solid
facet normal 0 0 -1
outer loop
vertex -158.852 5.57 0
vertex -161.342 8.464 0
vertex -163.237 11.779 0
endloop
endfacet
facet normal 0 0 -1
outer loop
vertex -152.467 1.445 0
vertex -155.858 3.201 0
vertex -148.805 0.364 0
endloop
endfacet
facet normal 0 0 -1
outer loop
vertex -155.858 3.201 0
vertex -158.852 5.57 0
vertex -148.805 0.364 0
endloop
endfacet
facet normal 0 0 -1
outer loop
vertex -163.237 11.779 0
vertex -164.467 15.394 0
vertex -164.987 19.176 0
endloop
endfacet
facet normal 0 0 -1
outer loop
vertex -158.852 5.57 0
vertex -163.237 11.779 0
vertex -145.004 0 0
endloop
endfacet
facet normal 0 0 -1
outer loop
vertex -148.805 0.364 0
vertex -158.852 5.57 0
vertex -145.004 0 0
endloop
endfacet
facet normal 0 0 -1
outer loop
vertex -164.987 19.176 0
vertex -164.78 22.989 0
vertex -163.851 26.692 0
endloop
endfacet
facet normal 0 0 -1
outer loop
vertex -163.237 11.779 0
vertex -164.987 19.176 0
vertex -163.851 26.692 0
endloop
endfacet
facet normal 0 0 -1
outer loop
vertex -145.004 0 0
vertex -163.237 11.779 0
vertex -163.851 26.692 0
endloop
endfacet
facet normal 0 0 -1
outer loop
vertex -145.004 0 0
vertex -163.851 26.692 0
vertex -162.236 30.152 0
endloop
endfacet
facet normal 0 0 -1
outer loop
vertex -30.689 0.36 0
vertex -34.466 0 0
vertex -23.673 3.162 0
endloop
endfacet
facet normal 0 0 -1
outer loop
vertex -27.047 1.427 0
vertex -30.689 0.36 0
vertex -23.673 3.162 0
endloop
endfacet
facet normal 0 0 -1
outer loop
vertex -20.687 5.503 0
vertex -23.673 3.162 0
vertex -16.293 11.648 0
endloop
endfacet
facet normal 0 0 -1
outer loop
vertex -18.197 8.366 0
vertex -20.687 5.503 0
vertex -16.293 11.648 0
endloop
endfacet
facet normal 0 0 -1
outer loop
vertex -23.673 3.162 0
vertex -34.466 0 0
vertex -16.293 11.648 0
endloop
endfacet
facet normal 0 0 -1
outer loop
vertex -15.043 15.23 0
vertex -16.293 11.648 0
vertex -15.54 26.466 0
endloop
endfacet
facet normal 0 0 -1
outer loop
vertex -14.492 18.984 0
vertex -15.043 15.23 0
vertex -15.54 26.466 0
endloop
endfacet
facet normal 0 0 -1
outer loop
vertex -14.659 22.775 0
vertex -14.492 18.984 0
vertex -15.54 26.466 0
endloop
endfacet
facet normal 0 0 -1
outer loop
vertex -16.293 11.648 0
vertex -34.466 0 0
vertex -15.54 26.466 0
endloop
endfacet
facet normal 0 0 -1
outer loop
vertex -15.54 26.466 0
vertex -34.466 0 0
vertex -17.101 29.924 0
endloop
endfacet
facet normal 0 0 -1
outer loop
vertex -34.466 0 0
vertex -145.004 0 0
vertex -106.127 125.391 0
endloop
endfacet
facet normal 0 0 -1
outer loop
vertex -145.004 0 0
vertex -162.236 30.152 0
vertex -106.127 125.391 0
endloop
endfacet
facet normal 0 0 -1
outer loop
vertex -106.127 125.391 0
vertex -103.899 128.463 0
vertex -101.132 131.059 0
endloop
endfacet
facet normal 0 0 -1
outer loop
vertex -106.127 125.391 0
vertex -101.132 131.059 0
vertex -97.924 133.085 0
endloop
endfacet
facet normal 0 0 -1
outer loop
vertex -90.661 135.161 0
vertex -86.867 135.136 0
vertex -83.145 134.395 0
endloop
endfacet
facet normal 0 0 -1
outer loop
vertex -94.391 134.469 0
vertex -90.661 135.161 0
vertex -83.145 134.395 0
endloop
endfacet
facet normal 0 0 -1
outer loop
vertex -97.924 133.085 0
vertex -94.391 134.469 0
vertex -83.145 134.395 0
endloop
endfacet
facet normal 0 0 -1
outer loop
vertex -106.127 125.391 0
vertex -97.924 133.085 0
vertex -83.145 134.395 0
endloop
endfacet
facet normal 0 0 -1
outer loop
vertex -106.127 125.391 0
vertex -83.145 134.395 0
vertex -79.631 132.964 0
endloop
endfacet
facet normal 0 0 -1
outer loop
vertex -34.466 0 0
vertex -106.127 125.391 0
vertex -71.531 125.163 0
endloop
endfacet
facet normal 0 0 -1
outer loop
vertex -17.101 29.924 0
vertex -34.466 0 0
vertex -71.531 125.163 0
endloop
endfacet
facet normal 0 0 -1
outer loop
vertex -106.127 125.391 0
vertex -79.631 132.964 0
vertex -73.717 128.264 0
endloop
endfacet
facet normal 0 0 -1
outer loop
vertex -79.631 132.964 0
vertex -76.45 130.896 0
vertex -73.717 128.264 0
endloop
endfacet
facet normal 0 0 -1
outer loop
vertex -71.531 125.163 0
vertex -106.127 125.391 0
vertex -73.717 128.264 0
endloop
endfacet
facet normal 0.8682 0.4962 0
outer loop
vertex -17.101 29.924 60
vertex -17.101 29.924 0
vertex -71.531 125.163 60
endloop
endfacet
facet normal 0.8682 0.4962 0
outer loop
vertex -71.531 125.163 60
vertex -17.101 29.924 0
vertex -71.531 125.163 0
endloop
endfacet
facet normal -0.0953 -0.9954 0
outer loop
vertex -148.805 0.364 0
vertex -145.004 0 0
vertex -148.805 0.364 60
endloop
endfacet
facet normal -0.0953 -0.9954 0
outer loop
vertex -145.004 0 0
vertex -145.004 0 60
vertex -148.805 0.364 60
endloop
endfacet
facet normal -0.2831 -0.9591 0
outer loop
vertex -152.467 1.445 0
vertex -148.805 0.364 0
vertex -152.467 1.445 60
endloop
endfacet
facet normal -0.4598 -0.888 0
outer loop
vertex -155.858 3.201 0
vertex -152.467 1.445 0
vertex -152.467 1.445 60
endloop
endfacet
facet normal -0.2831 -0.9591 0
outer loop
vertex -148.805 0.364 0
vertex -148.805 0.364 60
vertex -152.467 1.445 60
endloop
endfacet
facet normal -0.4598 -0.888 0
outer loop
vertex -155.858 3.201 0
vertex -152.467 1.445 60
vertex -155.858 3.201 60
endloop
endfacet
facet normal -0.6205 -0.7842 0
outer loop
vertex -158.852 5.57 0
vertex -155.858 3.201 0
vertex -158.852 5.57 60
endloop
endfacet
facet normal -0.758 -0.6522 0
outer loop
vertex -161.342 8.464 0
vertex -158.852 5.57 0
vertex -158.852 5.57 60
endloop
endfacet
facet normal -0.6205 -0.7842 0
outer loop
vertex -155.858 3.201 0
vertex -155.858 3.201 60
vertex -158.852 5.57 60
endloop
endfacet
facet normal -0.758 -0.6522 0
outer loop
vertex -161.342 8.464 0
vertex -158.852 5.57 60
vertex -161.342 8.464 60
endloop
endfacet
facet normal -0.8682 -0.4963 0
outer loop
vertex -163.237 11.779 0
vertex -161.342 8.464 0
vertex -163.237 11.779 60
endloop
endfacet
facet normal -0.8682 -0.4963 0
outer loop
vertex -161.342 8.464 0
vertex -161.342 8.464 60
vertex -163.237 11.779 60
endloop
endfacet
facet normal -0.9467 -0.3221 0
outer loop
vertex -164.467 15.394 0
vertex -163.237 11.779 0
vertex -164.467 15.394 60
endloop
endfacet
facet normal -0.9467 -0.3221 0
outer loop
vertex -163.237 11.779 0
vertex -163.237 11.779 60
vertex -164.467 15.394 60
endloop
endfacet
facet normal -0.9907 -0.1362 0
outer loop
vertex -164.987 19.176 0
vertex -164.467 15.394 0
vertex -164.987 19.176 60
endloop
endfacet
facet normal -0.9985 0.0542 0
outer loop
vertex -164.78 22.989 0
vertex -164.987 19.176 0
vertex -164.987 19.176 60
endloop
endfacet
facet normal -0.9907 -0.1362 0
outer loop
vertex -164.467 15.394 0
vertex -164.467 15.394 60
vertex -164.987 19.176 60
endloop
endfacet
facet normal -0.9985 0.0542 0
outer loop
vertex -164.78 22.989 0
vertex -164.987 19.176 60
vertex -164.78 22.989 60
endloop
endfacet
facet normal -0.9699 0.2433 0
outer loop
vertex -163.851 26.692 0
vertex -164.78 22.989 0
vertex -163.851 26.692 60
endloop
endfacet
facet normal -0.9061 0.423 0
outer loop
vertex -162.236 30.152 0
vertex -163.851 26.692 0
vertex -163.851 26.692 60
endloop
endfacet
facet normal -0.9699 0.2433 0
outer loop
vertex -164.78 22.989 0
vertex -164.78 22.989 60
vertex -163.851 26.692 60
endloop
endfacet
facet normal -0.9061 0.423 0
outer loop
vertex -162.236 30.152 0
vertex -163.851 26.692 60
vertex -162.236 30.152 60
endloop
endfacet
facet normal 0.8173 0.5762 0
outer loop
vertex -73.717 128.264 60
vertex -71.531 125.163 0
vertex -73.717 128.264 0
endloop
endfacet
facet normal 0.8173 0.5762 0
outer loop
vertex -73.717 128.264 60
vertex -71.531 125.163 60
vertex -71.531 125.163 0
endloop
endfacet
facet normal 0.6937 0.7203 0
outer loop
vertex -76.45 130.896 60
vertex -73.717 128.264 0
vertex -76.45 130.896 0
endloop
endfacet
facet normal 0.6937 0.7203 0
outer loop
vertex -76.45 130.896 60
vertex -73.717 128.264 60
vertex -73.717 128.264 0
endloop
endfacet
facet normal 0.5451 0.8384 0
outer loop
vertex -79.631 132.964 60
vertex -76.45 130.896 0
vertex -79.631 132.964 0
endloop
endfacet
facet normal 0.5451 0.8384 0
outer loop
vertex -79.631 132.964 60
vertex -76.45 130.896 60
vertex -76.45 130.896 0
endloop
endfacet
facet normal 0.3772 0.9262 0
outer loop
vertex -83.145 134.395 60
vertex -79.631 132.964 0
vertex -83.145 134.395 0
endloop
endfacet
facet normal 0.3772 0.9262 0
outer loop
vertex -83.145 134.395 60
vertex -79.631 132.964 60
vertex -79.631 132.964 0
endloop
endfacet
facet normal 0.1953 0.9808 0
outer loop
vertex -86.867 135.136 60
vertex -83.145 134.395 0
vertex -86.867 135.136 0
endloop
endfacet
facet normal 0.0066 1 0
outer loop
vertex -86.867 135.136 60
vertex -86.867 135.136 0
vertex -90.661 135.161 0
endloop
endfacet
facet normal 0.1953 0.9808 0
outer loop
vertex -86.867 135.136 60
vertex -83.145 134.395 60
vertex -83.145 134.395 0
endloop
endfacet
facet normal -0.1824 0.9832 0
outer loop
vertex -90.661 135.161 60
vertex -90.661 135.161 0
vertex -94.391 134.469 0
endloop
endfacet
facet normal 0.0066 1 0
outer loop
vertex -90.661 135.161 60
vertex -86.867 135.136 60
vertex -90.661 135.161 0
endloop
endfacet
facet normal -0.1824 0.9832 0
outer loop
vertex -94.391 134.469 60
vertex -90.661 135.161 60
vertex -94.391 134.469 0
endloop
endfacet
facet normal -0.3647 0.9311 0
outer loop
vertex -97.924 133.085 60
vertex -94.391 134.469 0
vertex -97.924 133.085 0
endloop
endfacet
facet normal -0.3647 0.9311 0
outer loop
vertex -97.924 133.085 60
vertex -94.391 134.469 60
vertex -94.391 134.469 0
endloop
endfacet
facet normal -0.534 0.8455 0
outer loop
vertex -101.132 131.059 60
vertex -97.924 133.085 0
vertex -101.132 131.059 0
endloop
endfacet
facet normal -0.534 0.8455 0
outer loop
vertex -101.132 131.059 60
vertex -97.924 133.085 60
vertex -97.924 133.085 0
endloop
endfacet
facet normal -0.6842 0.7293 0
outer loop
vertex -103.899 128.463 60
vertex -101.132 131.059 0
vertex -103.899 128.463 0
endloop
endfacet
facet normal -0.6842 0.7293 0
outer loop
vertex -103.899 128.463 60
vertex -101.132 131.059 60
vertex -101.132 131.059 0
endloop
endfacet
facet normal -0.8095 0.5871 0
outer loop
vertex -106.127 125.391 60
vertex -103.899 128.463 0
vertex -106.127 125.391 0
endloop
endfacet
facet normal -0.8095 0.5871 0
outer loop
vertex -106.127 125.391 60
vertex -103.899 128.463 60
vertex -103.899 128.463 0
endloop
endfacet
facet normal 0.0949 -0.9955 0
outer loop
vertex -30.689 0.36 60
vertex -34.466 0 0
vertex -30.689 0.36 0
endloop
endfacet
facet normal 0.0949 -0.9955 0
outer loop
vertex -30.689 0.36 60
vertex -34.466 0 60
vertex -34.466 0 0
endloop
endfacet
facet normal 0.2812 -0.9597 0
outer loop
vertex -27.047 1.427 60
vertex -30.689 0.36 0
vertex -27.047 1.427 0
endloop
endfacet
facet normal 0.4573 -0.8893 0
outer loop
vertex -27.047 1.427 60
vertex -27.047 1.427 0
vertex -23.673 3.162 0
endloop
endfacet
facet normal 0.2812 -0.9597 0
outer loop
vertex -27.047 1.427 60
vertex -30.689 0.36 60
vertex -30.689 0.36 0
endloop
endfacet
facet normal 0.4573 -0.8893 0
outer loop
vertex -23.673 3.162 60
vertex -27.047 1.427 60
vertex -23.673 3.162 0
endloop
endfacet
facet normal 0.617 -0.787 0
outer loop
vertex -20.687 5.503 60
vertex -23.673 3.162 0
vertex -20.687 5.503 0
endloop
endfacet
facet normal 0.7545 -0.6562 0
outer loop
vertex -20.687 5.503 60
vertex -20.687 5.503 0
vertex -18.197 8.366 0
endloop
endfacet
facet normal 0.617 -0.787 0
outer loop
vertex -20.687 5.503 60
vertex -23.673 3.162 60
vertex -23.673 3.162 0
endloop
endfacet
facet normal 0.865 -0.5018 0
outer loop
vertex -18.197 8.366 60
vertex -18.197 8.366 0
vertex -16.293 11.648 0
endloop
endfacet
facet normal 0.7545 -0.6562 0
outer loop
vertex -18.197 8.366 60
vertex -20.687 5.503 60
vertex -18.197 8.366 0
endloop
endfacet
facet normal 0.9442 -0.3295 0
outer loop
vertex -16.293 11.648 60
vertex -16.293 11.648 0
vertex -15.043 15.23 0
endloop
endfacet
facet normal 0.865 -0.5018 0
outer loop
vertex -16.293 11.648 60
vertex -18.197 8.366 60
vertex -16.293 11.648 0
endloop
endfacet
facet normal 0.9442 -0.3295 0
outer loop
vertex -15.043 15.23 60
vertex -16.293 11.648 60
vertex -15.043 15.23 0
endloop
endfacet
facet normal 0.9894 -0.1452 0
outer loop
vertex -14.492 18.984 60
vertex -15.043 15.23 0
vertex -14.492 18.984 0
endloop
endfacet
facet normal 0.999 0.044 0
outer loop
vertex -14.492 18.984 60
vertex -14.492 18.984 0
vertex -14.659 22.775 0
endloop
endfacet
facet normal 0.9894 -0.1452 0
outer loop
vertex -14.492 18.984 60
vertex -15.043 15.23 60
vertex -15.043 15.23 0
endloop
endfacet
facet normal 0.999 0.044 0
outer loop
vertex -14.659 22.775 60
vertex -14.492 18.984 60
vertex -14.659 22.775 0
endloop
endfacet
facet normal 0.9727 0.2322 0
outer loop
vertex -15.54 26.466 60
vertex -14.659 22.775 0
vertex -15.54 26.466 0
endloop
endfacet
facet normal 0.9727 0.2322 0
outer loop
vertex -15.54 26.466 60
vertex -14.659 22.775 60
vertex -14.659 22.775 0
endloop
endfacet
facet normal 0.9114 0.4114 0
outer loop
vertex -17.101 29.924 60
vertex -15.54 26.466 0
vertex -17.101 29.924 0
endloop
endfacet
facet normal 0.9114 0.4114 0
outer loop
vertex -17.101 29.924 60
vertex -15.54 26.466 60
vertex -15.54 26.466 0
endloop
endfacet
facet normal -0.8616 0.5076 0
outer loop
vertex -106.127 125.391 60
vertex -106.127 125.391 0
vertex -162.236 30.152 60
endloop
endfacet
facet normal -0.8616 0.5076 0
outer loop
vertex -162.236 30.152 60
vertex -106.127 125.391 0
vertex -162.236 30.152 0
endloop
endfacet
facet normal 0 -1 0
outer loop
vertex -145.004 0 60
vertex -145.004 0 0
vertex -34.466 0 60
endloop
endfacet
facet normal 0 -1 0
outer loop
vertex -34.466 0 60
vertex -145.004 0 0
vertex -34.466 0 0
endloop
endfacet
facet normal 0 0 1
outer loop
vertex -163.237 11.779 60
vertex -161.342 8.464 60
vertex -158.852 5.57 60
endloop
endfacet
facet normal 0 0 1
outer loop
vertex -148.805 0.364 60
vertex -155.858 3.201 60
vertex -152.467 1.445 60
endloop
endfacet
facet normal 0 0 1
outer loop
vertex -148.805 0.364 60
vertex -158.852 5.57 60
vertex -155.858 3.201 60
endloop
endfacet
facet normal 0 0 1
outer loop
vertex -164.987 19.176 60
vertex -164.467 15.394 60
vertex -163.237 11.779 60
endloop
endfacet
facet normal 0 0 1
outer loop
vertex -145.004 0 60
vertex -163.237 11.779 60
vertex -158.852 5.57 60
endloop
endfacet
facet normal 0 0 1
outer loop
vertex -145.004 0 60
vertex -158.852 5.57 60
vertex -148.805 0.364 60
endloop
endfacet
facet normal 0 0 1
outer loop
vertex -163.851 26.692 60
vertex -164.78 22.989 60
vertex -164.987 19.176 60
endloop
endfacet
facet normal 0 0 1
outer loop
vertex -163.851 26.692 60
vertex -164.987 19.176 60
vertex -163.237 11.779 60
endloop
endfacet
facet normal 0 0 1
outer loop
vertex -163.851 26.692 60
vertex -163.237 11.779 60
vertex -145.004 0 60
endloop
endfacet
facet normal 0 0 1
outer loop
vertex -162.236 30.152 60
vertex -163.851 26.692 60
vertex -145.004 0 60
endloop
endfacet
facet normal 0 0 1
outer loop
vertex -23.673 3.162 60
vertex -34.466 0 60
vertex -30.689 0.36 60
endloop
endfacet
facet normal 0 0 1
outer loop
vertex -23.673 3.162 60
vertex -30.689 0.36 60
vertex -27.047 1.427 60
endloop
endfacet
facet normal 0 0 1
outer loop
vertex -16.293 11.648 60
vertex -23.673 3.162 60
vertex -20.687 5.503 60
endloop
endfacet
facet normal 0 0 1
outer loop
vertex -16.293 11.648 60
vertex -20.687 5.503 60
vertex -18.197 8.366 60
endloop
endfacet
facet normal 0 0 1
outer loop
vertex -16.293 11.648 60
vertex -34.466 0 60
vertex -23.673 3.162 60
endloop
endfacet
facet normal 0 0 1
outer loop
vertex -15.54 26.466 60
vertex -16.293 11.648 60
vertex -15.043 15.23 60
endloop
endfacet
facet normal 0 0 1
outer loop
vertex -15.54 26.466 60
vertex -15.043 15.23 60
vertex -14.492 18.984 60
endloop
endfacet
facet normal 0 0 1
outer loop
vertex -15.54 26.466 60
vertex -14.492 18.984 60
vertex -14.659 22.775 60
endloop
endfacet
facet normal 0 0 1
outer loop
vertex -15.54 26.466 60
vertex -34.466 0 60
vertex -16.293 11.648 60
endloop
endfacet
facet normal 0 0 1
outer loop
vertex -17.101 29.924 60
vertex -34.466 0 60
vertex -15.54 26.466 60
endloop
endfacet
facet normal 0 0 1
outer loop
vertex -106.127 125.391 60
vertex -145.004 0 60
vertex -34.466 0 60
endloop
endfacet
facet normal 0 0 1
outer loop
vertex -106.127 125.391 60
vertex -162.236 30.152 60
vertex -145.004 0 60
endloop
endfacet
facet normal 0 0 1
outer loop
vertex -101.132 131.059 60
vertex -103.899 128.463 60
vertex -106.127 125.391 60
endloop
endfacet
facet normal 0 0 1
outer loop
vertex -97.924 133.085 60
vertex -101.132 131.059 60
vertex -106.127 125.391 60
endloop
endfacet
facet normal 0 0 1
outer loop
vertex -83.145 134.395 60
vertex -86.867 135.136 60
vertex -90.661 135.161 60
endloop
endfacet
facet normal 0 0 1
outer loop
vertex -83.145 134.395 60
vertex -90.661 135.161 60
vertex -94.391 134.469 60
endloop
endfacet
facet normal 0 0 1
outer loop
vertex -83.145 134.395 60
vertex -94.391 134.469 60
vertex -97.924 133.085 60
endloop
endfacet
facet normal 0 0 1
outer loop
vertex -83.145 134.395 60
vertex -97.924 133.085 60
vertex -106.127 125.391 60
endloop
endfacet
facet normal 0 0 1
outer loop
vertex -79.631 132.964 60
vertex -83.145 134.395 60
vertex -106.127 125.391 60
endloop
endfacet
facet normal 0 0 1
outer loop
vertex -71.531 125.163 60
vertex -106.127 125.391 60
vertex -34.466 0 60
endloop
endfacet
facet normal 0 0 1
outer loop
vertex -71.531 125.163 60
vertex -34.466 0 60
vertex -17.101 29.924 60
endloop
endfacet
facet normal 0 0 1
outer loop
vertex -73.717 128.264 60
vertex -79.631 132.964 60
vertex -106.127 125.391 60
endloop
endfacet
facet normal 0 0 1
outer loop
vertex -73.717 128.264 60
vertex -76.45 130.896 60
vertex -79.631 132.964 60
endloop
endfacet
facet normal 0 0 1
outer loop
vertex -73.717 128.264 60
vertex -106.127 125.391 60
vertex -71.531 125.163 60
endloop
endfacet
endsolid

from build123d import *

# Parameters (mm, degrees)
EXTRUDE_1_DEPTH = 30
FILLET_1_R      = 10
SCALE_1_SCALE   = 2


with BuildPart() as part:
    # 草图1 → 凸台-拉伸1 (new body)
    with BuildSketch(Plane.XY):
        Polygon((-90, 0), (0, 0), (-44.31605129, 77.54338676), align=None)
    extrude(amount=EXTRUDE_1_DEPTH)

    # 圆角1
    fillet_1_edges = [part.edges().sort_by_distance(p)[0] for p in [
        (0, 0, 15),
        (-90, 0, 15),
        (-44.31605129, 77.54338676, 15),
    ]]
    fillet(fillet_1_edges, radius=FILLET_1_R)


with BuildPart() as part_1:
    # 缩放比例1: scaled about (0, 0, 0)
    add(part.part.scale(SCALE_1_SCALE))


solid = part_1.part
